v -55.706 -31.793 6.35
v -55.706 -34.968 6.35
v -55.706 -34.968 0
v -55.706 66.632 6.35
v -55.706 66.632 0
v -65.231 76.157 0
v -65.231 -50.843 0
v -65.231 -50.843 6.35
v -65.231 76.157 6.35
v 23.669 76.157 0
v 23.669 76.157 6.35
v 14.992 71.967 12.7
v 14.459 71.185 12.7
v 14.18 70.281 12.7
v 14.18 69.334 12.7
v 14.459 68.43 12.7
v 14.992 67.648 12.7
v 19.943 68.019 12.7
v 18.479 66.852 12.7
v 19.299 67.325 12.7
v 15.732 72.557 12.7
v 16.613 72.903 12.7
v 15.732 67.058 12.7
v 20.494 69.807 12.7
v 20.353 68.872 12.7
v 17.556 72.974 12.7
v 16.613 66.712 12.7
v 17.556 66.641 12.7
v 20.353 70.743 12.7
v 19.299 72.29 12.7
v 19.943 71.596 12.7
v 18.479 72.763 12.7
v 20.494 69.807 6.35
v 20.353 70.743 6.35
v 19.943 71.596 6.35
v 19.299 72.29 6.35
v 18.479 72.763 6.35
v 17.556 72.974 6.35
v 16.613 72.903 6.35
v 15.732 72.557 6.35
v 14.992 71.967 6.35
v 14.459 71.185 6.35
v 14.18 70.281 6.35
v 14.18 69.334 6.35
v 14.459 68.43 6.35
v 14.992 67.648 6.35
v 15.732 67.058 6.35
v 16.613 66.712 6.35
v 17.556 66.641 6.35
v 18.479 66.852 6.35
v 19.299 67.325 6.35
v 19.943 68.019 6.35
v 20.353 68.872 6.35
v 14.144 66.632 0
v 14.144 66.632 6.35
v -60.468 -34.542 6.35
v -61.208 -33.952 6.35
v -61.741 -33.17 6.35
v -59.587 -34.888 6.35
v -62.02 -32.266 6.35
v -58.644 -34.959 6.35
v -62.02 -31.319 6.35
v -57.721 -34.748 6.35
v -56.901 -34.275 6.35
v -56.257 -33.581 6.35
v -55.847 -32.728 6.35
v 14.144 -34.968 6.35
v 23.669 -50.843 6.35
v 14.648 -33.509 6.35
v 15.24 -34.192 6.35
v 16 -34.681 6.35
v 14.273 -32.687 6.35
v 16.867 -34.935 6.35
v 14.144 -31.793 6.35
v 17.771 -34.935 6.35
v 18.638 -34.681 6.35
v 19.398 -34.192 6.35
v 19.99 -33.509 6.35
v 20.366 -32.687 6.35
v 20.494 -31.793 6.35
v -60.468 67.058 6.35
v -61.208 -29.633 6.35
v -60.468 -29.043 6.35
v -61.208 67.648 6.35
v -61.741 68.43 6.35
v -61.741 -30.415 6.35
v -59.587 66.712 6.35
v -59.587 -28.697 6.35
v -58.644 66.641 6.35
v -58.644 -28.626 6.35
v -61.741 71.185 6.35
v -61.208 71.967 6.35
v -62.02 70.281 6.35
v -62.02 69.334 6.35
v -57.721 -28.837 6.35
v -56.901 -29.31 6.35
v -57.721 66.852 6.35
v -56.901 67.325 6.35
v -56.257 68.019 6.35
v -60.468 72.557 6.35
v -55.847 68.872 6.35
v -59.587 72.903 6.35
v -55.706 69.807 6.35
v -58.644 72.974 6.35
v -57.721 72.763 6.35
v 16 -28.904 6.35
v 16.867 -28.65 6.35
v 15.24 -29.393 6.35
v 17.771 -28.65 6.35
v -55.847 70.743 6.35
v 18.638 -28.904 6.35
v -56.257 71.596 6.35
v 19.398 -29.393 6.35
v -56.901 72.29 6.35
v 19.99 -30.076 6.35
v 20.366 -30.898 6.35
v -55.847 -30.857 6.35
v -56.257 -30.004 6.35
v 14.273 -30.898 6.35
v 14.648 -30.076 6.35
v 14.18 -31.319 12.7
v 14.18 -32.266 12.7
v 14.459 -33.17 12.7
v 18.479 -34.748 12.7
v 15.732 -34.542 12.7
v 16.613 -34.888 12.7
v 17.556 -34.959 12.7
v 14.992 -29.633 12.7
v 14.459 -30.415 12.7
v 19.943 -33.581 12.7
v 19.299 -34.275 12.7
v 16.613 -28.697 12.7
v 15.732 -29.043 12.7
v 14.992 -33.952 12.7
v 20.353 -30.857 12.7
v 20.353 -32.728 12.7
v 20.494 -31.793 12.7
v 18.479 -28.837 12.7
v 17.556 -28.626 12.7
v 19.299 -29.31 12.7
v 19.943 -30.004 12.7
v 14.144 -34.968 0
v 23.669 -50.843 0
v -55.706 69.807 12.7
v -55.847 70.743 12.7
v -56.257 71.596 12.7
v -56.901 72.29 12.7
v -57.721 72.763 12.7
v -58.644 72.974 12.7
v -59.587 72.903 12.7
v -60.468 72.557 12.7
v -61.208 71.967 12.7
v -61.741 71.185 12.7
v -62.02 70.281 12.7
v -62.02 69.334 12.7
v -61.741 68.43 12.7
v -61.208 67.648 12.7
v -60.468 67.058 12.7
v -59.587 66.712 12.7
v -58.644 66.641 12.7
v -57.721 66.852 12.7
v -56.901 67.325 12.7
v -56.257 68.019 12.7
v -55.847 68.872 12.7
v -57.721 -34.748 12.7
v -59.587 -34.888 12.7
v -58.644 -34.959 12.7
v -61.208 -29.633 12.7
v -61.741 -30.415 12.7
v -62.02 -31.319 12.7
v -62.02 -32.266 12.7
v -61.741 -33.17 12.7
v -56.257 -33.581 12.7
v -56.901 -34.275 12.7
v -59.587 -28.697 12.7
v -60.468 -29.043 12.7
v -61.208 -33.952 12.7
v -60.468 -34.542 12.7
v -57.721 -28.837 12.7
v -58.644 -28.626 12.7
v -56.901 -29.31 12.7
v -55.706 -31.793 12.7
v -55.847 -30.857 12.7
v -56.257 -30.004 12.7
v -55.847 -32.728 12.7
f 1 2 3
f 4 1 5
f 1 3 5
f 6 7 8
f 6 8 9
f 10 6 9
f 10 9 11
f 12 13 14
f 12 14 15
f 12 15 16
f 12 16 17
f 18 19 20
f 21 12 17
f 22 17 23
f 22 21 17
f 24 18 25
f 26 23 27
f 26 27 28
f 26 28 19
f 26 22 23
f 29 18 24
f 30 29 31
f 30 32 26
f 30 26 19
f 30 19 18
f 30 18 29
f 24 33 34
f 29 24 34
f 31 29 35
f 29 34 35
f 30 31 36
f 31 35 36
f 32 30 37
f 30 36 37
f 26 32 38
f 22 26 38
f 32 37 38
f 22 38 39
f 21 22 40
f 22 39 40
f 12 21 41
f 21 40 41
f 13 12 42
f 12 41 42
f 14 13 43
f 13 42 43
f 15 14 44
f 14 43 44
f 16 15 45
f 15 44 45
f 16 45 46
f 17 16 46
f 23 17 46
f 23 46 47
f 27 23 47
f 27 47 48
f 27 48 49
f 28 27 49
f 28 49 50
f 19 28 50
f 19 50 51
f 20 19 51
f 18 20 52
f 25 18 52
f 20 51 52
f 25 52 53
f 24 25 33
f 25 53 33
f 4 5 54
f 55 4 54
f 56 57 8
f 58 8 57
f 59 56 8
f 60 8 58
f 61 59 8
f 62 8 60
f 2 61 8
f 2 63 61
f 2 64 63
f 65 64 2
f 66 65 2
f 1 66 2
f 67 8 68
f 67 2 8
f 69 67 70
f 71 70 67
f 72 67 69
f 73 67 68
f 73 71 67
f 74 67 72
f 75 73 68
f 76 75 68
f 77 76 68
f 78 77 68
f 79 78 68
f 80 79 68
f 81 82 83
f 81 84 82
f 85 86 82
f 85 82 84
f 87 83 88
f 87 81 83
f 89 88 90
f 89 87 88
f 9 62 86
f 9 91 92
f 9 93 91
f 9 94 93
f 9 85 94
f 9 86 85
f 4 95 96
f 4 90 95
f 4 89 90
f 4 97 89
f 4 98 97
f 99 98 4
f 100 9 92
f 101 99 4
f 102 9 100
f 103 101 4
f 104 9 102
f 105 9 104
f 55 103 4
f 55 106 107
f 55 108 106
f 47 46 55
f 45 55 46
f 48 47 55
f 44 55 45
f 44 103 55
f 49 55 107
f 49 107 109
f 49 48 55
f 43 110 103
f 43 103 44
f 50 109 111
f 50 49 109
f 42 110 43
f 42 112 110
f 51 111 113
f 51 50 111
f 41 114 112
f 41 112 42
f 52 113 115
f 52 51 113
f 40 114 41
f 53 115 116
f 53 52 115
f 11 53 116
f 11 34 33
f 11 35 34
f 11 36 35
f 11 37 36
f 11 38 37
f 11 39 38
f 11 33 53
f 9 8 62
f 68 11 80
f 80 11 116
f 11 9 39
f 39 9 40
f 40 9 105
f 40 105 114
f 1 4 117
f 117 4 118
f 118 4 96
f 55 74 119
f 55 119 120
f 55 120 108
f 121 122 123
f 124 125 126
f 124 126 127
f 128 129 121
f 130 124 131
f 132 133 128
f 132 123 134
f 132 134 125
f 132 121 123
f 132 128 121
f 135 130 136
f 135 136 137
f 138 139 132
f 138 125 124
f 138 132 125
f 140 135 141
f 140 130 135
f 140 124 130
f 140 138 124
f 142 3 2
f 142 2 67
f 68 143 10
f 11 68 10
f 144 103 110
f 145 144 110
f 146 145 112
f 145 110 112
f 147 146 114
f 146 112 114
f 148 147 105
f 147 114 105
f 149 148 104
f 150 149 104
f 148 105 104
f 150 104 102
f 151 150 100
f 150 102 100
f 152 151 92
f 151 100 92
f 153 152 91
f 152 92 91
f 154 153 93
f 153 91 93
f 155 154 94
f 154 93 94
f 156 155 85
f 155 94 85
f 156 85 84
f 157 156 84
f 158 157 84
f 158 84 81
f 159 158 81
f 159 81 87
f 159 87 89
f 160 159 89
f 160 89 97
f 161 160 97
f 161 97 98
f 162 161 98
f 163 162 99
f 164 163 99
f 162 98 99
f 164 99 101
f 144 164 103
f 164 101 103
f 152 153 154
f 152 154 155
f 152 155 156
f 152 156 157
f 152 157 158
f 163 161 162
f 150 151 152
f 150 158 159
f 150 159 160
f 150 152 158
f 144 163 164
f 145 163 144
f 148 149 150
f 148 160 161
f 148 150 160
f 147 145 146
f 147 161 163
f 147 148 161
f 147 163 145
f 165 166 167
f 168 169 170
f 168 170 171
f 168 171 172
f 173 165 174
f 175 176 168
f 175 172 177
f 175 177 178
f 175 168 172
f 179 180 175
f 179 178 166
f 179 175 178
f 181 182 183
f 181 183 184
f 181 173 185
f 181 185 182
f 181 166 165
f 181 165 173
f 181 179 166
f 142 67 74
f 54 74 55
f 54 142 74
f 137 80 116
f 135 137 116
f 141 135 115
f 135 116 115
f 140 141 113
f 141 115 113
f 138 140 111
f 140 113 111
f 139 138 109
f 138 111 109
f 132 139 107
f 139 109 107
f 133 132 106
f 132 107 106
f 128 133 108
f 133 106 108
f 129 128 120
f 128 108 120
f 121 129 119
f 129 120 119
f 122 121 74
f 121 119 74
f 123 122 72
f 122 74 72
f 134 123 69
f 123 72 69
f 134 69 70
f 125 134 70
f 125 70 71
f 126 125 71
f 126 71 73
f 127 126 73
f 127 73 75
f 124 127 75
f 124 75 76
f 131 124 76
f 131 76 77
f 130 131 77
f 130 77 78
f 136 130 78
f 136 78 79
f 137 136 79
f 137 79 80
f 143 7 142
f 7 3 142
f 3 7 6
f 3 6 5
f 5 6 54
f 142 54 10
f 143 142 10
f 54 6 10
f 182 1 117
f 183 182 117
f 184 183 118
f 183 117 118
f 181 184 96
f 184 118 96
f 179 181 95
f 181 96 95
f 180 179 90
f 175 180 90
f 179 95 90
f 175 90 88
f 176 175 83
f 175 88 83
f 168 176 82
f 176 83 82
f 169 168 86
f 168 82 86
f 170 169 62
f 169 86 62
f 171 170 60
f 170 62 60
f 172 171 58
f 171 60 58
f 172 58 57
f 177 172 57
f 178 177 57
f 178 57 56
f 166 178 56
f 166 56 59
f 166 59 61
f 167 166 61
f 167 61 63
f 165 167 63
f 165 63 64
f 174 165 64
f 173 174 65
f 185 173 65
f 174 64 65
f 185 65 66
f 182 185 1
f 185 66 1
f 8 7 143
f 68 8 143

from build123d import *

# Parameters (mm, degrees)
F0_W     = 88.9
F0_H     = 127
F0_W_2   = 69.85
F0_H_2   = 101.6
F1_DEPTH = 6.35
F2_R     = 3.175
F3_DEPTH = 6.35


with BuildPart() as f1:
    # F0 (on Top) → F1 (new body)
    with BuildSketch(Plane.XY):
        with Locations((-20.780801, 12.657491)):
            Rectangle(F0_W, F0_H)
        with Locations((-20.780801, 15.832491)):
            Rectangle(F0_W_2, F0_H_2, mode=Mode.SUBTRACT)
    extrude(amount=F1_DEPTH)

    # F2 (on face) → F3 (join)
    with BuildSketch(Plane.XY.offset(6.35)):
        with Locations((-58.880801, 69.807491)):
            Circle(F2_R)
        with Locations((-58.880801, -31.792509)):
            Circle(F2_R)
        with Locations((17.319199, 69.807491)):
            Circle(F2_R)
        with Locations((17.319199, -31.792509)):
            Circle(F2_R)
    extrude(amount=F3_DEPTH)


solid = f1.part
